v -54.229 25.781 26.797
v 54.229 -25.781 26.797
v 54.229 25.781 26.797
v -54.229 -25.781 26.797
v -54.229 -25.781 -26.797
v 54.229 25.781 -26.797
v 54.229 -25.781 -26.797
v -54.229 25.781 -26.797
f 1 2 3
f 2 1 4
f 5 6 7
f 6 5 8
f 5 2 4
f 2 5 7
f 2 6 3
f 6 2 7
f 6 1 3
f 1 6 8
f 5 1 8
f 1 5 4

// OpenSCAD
// file: ../settings.scad
// Common settings used by all scad files.

// ALL UNITS IN MILLIMETERS (MM)!!!

$fn = 30;//low-res but fast to render
//$fn = 50;//higher-res but slow to render

pi = 3.1415926535897932384626433832795;

max_footprint = 150; // 15x15 cm

bottom_clearance = 10;
bottom_clearance = 25.4/2+10;
//bottom_clearance = 30;

shell_alpha = 0.215;
//shell_alpha = 1.0;

tolerance = 0.5;

// Flat countersunk M2.5mm x 0.45mm machine screw.
screw_thread_diameter = 2.5;//2.8;//2.75;//2.4?
screw_thread_length = 5;//?
screw_head_diameter = 4.75; // M2.5
//screw_head_diameter = 5.2; // M3
screw_head_height = 1.5;//2;

screw_thread_diameter2 = 2;

unit_thickness = 5;
u = unit_thickness;

shell_thickness = unit_thickness;

// Show flags.
show_platform = 0;
show_head = 1;
show_head_shell = 0;
show_head_electronics_bb = 0;
show_battery = 1;
show_foot_cube = 0;
show_torso = 0;
show_motor = 0;
show_motor_plates = 1;
show_motor_inner_plates = 1;
show_motor_outer_plates = 1;
show_wheel = 0;//obsolete
show_tracks = 1;//
show_track_wheels = 1;
show_caster = 0;
show_rpi = 1;
show_vertical_plates = 1;//
show_horizontal_plates = 1;//
show_caster_plates = 0;//obsolete?
show_camera = 1;
show_screen = 0;
show_edge_mount = 1;
show_sonar_mount = 1;
show_recharge_mount = 1;
show_conduit = 1;
show_torso_shell = 1;
show_recharge_dock = 0;
show_head_tilt_axis = 0;
show_rpi_camera_axis = 0;
show_laser_axis = 0;

head_vertical_angle_tilt = 0;
//head_vertical_angle_tilt = 30;//max
//head_vertical_angle_tilt = 10;

torso_height = 120+20;

base_plate_diameter = max_footprint-unit_thickness*2;
base_plate_frame = 0;

head_height = 50;
head_offset_z = max_footprint/2;
head_middle_cutout = 85;

rpi_with_four_hats_and_clearance = 76;

qrd1114_w = 6.10;
qrd1114_l = 4.39;
qrd1114_h = 4.65;

dock_radius = 10;
dock_gripper_border = 2;
dock_gripper_instep = 0.9;
dock_gripper_cutout_tapper = 50;
dock_receiver_height = 5;

// Patriod Fuel+ 9000 mAh
battery_length = 90;
battery_width = 57;
battery_height = 23;
battery_offset_z = 30;//4;

wheel_diameter = 50;
wheel_offset_x = 65;
wheel_offset_z = wheel_diameter/2;
wheel_axle_diameter = 5;

//caster_diameter = 19.05; // 0.75 inches
caster_diameter = 25.45; // 1 inches
//caster_diameter = 15.875; // 5/8 inches
caster_holder_diameter = 30;//31;
caster_offset_y = base_plate_diameter/2 - caster_holder_diameter/2;

arduino_offset_x = 0;
arduino_offset_y = 0;
arduino_offset_z = 67;
arduino_offset_x2 = 0;
arduino_offset_y2 = -20;
arduino_offset_z2 = torso_height+bottom_clearance;

horizontal_plate_width = unit_thickness*8*2 - unit_thickness*2;
horizontal_plate_depth = unit_thickness*8*2;

vertical_plate_width = horizontal_plate_depth;
vertical_plate_height = unit_thickness*8;
vertical_plate_offset_x = wheel_offset_x-22.5;
vertical_plate_offset_z = vertical_plate_height/2 + unit_thickness/2;

vertical_battery_plate_height = 100 - 15;

caster_plate_width = horizontal_plate_width + unit_thickness*2;
caster_plate_mount_length = unit_thickness*4;
caster_plate_width_minor = caster_holder_diameter;

motor_switch_length = 20;
motor_switch_thickness = 6.5;
motor_switch_height = 11;
motor_switch_height_leads = 23;
motor_switch_on_height =  13.3;
motor_switch_hole_diameter = 2.5;
motor_switch_hole_offset_z = 6.5;//this plus diameter/2 is hole center from switch top
motor_switch_hole_spacing = 7.1;// holes are diameter/2 from this

motor_length = 60;
motor_width = 25;
motor_collar_width = 7;
motor_collar_height = 2.5;
motor_axle_width = 4;
motor_axle_height = 9.5;
motor_offset_x = 10;
//motor_offset_y = motor_width/2+5;
motor_offset_y = unit_thickness*3.5;
motor_offset_z = vertical_plate_height/2 - unit_thickness/2;//4;//30;
motor_mount_holes_dist = 17;
// motor countersink hole
motor_mount_holes_width = 3; // M3
motor_mount_holes_head_height = 2.2;
motor_mount_holes_head_width = 5.8;
motor_bearing_outer_diameter = 10;
motor_bearing_inner_diameter = 5.95;
motor_bearing_thickness = 2.5;

motor_unimount_idler_axle_d = screw_thread_diameter;
//motor_unimount_spacer_depth = 0.1;//too small
motor_unimount_spacer_depth = 0.5;

motor_arm_offset_y = -u*3;
motor_arm_offset_z = u*.5;

motor_plate_width = vertical_plate_width;
motor_plate_height = vertical_plate_height;
motor_plate_thickness = unit_thickness;
motor_plate_offset_z = vertical_plate_offset_z;

motor_plate_middle_thickness = 5;

wheel_hub_offset = u*3;

motor_hole_height_offset = -5;

nylon_spacer_outer_diameter = 6.35;
nylon_spacer_inner_diameter = 3.302;
nylon_spacer_length = 12.7;

track_width = unit_thickness*3;
track_offset_x = -50;
track_offset_z = .1;
//track_wheel_radius = 19;//original
track_wheel_radius = 14;
//track_wheel_hole_radius = (nylon_spacer_outer_diameter+1)/2;
track_wheel_hole_radius = motor_bearing_outer_diameter/2;

track_driver_hole_radius = (motor_axle_width)/2 + 0.1;
track_driver_set_screw_head_d = 4.1;
track_driver_set_screw_shaft_d = 2.4;
//track_wheel_width = 13.5;//original
track_wheel_width = u*2;
track_wheel_width_buffer = u*0.25;
track_offset = 3;        //distance from chassis
track_wheel_offset = track_offset;
//track_length = 250; // see tread_triangle.py, too big
//track_length = 240; // see tread_triangle.py
//track_length = 238; //inc/dec in 10 unit increments so notches match idlers
track_length = 228; //inc/dec in 10 unit increments so notches match idlers
track_radius = track_length/2/pi;
track_wheel_show_fancy = 1;
track_wheel_gap = track_wheel_width + track_wheel_width_buffer*2;
track_axle_bearing_diameter = motor_bearing_inner_diameter - 0.1;
track_tensioner_radius = 12;
track_nut_height = 3.5; //TODO
track_punchout_thickness = 0.25;//should be the same as the minimum layer thickness

head_slew_bearing_outer_diameter = 115;
head_slew_bearing_ring_thickness = 20;
head_slew_bearing_inner_diameter = head_slew_bearing_outer_diameter - head_slew_bearing_ring_thickness;
//head_slew_bearing_hole_diameter = head_slew_bearing_inner_diameter - head_slew_bearing_ring_thickness;
head_slew_bearing_hole_diameter = 12+tolerance; // slip ring https://www.adafruit.com/products/775
//head_slew_bearing_ball_diameter = 5;
head_slew_bearing_ball_diameter = 2.5; //u/2;
head_slew_bearing_height = u;//head_slew_bearing_ball_diameter*2;
head_slew_bearing_gap = 0.5;
head_slew_bearing_slew_gap = 0;
head_slew_bearing_gap_factor = 0.1;

neck_strut_width = u*7;
neck_strut_height = u*18;
neck_strut_spacing = u*8;

show_outer_race = 0;
show_inner_race_a = 1;
show_inner_race_b = 1;
show_balls = 0;
// main file
include <../settings.scad>;

module make_rpi_camera(){
    //http://uk.rs-online.com/web/p/video-modules/7757731/
	translate([0,0,2.5+2]){
    cylinder(d=8.5, h=5, center=true);
    translate([0,0,-2-2.5])
    cube([25,20,4], center=true);
	}
}

module make_creative_senz(){
    //
    cube([4.27*25.4, 2.03*25.4, 2.11*25.4], center=true);
}

//make_rpi_camera();
make_creative_senz();
